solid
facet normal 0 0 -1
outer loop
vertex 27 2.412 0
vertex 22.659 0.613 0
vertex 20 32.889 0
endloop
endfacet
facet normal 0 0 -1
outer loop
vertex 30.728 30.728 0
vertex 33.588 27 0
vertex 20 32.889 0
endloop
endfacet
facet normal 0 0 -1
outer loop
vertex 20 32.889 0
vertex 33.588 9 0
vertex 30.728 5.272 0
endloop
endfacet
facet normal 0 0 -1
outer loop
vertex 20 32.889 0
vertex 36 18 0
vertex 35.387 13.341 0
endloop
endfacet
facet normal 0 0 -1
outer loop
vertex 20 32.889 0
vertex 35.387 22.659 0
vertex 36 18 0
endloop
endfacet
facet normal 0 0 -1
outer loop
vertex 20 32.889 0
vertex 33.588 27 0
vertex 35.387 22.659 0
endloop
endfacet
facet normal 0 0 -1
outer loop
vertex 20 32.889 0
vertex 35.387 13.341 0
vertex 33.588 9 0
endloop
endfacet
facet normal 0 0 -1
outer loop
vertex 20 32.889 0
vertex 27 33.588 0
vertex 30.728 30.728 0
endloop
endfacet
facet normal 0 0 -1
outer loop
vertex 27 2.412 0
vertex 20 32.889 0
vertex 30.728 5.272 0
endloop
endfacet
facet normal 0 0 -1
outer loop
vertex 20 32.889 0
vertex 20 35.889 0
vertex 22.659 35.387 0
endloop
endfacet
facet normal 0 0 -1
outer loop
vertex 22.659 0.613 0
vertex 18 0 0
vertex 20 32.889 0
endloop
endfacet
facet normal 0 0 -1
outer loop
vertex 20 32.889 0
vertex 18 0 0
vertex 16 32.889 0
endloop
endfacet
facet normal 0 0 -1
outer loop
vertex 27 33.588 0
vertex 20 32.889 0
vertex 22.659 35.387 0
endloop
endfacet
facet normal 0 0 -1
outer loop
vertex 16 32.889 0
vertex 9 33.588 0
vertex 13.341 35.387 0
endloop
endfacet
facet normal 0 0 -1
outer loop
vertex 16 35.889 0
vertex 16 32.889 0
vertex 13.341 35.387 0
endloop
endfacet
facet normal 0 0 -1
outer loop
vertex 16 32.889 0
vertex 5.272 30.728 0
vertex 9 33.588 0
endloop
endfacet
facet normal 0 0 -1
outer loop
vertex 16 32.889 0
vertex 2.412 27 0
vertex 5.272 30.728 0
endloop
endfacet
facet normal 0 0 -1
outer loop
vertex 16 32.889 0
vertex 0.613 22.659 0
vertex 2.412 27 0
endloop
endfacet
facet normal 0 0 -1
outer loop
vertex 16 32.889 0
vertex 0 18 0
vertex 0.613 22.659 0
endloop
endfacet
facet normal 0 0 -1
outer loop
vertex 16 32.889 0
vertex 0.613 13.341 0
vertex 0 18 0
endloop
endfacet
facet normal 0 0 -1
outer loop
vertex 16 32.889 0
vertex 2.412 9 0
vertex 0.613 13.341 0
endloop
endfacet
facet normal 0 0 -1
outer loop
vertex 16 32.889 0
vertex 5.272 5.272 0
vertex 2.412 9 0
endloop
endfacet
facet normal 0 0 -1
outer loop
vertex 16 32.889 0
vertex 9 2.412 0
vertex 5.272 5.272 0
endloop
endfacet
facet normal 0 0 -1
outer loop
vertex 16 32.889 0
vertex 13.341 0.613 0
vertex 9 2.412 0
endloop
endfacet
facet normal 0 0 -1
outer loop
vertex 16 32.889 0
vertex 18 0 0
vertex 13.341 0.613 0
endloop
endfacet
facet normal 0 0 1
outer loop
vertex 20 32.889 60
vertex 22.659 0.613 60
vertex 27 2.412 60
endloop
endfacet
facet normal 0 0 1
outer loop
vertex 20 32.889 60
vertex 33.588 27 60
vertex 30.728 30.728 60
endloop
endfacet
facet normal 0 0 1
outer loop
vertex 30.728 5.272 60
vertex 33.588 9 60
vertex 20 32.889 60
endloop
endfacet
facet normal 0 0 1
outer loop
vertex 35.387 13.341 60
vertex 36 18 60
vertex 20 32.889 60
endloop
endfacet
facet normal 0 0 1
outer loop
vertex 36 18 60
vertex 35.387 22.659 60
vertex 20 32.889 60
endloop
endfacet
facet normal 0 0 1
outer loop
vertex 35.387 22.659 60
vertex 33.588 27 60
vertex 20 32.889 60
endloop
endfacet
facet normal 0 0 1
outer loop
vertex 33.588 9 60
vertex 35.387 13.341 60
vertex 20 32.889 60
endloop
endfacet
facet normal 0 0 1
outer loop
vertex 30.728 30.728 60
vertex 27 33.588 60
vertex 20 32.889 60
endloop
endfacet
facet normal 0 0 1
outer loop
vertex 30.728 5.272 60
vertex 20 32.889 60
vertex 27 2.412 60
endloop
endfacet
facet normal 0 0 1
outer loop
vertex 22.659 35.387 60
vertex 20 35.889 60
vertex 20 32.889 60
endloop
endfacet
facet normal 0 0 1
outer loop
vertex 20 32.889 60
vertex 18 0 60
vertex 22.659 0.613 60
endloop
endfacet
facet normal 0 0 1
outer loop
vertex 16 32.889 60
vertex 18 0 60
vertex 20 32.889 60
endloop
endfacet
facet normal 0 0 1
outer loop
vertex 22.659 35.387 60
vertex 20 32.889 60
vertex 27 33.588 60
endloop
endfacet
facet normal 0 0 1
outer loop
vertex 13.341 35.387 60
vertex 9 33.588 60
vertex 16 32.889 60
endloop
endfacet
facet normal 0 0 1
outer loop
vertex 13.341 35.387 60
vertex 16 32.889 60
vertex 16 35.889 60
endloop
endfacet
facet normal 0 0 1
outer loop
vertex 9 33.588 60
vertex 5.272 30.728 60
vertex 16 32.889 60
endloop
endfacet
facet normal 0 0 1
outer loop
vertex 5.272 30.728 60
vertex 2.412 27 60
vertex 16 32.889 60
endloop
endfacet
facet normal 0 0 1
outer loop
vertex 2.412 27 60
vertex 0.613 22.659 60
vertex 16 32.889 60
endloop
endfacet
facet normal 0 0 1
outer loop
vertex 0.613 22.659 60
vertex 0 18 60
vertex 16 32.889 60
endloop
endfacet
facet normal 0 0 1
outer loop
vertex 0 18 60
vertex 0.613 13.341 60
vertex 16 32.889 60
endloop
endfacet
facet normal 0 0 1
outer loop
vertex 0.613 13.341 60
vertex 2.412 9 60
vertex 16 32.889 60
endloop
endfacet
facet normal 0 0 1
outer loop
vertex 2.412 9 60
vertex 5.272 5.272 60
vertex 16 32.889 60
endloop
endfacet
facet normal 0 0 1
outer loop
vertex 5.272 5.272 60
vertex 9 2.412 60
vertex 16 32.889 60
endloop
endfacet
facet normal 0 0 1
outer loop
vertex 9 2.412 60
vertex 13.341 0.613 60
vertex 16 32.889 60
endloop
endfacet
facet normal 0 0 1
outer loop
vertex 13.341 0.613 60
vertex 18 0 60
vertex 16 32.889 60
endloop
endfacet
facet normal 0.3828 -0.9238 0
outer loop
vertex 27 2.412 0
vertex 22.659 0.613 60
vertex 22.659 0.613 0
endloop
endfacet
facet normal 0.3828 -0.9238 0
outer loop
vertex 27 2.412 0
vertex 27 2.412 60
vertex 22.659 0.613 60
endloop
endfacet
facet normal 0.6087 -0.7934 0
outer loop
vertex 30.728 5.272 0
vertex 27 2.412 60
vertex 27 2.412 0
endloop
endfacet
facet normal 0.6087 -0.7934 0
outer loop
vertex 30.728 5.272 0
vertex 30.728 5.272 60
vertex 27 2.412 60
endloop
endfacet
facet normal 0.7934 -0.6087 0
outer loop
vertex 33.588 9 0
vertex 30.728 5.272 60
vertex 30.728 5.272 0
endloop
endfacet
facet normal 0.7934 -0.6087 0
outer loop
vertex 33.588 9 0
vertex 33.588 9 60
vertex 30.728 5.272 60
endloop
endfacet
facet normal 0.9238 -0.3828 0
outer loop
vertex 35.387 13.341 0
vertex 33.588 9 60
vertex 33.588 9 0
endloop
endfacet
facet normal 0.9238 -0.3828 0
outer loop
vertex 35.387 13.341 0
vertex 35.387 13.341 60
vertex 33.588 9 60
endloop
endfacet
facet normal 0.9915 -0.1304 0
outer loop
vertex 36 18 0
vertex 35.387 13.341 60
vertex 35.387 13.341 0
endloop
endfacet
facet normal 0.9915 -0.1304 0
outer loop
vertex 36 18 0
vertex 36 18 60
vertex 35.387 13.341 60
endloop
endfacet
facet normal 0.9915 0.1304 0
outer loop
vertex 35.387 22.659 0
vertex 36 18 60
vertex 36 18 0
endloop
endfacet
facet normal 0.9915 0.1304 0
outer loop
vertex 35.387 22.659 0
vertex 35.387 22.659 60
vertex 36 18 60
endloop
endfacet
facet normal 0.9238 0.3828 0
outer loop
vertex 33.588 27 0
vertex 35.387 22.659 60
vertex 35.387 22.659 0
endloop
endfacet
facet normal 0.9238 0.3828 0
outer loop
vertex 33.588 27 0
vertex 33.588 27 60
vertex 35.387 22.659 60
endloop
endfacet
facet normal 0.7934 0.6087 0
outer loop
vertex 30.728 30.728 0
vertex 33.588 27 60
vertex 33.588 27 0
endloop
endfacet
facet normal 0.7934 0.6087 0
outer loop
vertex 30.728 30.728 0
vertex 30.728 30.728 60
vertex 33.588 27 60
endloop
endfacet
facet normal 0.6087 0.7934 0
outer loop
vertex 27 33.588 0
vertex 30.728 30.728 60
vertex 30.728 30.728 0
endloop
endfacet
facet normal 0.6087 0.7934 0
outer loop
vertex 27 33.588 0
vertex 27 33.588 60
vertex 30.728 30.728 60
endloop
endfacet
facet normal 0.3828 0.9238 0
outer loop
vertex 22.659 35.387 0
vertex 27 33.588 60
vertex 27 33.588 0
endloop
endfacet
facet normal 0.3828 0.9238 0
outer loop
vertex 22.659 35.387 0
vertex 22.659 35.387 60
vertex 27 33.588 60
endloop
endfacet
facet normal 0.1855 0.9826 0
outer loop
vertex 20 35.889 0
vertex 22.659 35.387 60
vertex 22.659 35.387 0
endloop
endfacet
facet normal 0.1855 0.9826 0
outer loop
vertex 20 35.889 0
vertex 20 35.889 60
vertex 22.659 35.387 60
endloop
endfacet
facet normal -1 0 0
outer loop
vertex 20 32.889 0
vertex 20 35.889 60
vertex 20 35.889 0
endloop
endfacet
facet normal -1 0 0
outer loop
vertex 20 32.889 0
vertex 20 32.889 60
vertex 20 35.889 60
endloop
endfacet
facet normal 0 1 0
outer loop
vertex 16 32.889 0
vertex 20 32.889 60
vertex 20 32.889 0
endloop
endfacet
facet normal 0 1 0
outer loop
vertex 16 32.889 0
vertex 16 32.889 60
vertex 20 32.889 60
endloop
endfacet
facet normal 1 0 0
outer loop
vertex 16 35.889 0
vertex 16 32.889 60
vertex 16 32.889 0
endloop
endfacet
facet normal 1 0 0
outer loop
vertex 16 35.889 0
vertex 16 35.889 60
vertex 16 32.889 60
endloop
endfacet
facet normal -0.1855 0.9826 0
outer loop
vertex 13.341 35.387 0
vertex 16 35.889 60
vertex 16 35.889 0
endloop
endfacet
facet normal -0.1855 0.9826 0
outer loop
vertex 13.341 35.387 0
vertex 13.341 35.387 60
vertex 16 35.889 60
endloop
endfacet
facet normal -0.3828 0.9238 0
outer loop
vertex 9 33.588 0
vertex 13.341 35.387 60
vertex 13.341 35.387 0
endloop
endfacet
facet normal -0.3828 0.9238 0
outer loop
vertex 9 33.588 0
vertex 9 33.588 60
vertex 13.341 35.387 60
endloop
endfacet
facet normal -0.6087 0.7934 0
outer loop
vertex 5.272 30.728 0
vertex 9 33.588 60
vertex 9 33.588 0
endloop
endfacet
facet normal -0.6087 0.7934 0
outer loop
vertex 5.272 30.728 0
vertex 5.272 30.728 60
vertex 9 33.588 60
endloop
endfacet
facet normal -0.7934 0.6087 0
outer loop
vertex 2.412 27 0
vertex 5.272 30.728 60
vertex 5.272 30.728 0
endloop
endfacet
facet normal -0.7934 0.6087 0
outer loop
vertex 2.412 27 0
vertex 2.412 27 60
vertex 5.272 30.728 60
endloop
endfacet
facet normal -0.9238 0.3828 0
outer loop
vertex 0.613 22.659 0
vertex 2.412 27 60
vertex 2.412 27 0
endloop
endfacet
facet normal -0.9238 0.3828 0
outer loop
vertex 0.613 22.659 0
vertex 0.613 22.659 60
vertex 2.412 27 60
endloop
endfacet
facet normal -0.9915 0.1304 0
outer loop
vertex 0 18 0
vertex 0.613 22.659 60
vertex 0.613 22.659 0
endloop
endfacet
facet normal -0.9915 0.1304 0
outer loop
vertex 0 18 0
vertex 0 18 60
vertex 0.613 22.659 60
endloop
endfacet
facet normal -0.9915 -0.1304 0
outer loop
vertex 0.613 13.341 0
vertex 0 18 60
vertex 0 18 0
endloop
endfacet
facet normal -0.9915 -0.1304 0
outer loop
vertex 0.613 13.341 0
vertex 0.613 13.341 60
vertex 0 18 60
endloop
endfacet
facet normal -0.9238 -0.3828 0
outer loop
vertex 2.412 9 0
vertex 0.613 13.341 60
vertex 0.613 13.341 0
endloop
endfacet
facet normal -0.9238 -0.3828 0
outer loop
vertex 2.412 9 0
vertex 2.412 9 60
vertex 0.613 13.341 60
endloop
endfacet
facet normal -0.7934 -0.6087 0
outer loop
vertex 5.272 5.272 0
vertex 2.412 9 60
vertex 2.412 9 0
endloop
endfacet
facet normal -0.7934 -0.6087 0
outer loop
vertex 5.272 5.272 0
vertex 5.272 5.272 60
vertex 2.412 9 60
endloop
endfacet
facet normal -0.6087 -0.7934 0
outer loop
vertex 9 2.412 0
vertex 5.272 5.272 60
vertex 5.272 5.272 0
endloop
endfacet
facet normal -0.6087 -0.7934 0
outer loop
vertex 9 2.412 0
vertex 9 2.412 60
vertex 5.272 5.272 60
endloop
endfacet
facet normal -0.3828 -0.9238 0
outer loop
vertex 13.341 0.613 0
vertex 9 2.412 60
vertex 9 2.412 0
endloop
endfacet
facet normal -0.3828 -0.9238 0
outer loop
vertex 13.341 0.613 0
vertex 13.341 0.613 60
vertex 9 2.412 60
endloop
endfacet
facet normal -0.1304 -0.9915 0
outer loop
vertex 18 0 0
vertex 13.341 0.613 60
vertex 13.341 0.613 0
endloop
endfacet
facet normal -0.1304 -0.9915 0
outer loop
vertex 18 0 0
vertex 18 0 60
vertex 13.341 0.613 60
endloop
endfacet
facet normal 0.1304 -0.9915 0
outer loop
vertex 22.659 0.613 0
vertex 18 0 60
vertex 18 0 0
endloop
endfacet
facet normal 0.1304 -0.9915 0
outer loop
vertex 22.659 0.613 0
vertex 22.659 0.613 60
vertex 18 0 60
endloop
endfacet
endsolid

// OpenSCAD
$fn = 32;

// ----------------------------------------------------------------------
// Keyway shaft: d36 shaft, key 4 x 3 mm
// ----------------------------------------------------------------------

// --- parameters (mm) ---
shaft_r = 18;             // shaft radius
key_w = 4;                // keyway width
key_d = 3;                // keyway depth below the surface line
plate_t = 60;             // shaft length, Z (extrusion height)
fit_tol = 0.02;           // declared fit tolerance (prompt contract)
free_tol = 0.2;           // declared free tolerance (prompt contract)

shaft_d = 2 * shaft_r;  // shaft diameter
circle_step = 15;  // polygon sampling step, degrees

profile = [[13.341, 35.387], [9, 33.588], [5.272, 30.728], [2.412, 27], [0.613, 22.659], [0, 18], [0.613, 13.341], [2.412, 9], [5.272, 5.272], [9, 2.412], [13.341, 0.613], [18, 0], [22.659, 0.613], [27, 2.412], [30.728, 5.272], [33.588, 9], [35.387, 13.341], [36, 18], [35.387, 22.659], [33.588, 27], [30.728, 30.728], [27, 33.588], [22.659, 35.387], [20, 35.889], [20, 32.889], [16, 32.889], [16, 35.889]];  // primary outline, 27 points, counter clockwise

// --- the one profile operation ---
linear_extrude(height = plate_t) polygon(points = profile);
